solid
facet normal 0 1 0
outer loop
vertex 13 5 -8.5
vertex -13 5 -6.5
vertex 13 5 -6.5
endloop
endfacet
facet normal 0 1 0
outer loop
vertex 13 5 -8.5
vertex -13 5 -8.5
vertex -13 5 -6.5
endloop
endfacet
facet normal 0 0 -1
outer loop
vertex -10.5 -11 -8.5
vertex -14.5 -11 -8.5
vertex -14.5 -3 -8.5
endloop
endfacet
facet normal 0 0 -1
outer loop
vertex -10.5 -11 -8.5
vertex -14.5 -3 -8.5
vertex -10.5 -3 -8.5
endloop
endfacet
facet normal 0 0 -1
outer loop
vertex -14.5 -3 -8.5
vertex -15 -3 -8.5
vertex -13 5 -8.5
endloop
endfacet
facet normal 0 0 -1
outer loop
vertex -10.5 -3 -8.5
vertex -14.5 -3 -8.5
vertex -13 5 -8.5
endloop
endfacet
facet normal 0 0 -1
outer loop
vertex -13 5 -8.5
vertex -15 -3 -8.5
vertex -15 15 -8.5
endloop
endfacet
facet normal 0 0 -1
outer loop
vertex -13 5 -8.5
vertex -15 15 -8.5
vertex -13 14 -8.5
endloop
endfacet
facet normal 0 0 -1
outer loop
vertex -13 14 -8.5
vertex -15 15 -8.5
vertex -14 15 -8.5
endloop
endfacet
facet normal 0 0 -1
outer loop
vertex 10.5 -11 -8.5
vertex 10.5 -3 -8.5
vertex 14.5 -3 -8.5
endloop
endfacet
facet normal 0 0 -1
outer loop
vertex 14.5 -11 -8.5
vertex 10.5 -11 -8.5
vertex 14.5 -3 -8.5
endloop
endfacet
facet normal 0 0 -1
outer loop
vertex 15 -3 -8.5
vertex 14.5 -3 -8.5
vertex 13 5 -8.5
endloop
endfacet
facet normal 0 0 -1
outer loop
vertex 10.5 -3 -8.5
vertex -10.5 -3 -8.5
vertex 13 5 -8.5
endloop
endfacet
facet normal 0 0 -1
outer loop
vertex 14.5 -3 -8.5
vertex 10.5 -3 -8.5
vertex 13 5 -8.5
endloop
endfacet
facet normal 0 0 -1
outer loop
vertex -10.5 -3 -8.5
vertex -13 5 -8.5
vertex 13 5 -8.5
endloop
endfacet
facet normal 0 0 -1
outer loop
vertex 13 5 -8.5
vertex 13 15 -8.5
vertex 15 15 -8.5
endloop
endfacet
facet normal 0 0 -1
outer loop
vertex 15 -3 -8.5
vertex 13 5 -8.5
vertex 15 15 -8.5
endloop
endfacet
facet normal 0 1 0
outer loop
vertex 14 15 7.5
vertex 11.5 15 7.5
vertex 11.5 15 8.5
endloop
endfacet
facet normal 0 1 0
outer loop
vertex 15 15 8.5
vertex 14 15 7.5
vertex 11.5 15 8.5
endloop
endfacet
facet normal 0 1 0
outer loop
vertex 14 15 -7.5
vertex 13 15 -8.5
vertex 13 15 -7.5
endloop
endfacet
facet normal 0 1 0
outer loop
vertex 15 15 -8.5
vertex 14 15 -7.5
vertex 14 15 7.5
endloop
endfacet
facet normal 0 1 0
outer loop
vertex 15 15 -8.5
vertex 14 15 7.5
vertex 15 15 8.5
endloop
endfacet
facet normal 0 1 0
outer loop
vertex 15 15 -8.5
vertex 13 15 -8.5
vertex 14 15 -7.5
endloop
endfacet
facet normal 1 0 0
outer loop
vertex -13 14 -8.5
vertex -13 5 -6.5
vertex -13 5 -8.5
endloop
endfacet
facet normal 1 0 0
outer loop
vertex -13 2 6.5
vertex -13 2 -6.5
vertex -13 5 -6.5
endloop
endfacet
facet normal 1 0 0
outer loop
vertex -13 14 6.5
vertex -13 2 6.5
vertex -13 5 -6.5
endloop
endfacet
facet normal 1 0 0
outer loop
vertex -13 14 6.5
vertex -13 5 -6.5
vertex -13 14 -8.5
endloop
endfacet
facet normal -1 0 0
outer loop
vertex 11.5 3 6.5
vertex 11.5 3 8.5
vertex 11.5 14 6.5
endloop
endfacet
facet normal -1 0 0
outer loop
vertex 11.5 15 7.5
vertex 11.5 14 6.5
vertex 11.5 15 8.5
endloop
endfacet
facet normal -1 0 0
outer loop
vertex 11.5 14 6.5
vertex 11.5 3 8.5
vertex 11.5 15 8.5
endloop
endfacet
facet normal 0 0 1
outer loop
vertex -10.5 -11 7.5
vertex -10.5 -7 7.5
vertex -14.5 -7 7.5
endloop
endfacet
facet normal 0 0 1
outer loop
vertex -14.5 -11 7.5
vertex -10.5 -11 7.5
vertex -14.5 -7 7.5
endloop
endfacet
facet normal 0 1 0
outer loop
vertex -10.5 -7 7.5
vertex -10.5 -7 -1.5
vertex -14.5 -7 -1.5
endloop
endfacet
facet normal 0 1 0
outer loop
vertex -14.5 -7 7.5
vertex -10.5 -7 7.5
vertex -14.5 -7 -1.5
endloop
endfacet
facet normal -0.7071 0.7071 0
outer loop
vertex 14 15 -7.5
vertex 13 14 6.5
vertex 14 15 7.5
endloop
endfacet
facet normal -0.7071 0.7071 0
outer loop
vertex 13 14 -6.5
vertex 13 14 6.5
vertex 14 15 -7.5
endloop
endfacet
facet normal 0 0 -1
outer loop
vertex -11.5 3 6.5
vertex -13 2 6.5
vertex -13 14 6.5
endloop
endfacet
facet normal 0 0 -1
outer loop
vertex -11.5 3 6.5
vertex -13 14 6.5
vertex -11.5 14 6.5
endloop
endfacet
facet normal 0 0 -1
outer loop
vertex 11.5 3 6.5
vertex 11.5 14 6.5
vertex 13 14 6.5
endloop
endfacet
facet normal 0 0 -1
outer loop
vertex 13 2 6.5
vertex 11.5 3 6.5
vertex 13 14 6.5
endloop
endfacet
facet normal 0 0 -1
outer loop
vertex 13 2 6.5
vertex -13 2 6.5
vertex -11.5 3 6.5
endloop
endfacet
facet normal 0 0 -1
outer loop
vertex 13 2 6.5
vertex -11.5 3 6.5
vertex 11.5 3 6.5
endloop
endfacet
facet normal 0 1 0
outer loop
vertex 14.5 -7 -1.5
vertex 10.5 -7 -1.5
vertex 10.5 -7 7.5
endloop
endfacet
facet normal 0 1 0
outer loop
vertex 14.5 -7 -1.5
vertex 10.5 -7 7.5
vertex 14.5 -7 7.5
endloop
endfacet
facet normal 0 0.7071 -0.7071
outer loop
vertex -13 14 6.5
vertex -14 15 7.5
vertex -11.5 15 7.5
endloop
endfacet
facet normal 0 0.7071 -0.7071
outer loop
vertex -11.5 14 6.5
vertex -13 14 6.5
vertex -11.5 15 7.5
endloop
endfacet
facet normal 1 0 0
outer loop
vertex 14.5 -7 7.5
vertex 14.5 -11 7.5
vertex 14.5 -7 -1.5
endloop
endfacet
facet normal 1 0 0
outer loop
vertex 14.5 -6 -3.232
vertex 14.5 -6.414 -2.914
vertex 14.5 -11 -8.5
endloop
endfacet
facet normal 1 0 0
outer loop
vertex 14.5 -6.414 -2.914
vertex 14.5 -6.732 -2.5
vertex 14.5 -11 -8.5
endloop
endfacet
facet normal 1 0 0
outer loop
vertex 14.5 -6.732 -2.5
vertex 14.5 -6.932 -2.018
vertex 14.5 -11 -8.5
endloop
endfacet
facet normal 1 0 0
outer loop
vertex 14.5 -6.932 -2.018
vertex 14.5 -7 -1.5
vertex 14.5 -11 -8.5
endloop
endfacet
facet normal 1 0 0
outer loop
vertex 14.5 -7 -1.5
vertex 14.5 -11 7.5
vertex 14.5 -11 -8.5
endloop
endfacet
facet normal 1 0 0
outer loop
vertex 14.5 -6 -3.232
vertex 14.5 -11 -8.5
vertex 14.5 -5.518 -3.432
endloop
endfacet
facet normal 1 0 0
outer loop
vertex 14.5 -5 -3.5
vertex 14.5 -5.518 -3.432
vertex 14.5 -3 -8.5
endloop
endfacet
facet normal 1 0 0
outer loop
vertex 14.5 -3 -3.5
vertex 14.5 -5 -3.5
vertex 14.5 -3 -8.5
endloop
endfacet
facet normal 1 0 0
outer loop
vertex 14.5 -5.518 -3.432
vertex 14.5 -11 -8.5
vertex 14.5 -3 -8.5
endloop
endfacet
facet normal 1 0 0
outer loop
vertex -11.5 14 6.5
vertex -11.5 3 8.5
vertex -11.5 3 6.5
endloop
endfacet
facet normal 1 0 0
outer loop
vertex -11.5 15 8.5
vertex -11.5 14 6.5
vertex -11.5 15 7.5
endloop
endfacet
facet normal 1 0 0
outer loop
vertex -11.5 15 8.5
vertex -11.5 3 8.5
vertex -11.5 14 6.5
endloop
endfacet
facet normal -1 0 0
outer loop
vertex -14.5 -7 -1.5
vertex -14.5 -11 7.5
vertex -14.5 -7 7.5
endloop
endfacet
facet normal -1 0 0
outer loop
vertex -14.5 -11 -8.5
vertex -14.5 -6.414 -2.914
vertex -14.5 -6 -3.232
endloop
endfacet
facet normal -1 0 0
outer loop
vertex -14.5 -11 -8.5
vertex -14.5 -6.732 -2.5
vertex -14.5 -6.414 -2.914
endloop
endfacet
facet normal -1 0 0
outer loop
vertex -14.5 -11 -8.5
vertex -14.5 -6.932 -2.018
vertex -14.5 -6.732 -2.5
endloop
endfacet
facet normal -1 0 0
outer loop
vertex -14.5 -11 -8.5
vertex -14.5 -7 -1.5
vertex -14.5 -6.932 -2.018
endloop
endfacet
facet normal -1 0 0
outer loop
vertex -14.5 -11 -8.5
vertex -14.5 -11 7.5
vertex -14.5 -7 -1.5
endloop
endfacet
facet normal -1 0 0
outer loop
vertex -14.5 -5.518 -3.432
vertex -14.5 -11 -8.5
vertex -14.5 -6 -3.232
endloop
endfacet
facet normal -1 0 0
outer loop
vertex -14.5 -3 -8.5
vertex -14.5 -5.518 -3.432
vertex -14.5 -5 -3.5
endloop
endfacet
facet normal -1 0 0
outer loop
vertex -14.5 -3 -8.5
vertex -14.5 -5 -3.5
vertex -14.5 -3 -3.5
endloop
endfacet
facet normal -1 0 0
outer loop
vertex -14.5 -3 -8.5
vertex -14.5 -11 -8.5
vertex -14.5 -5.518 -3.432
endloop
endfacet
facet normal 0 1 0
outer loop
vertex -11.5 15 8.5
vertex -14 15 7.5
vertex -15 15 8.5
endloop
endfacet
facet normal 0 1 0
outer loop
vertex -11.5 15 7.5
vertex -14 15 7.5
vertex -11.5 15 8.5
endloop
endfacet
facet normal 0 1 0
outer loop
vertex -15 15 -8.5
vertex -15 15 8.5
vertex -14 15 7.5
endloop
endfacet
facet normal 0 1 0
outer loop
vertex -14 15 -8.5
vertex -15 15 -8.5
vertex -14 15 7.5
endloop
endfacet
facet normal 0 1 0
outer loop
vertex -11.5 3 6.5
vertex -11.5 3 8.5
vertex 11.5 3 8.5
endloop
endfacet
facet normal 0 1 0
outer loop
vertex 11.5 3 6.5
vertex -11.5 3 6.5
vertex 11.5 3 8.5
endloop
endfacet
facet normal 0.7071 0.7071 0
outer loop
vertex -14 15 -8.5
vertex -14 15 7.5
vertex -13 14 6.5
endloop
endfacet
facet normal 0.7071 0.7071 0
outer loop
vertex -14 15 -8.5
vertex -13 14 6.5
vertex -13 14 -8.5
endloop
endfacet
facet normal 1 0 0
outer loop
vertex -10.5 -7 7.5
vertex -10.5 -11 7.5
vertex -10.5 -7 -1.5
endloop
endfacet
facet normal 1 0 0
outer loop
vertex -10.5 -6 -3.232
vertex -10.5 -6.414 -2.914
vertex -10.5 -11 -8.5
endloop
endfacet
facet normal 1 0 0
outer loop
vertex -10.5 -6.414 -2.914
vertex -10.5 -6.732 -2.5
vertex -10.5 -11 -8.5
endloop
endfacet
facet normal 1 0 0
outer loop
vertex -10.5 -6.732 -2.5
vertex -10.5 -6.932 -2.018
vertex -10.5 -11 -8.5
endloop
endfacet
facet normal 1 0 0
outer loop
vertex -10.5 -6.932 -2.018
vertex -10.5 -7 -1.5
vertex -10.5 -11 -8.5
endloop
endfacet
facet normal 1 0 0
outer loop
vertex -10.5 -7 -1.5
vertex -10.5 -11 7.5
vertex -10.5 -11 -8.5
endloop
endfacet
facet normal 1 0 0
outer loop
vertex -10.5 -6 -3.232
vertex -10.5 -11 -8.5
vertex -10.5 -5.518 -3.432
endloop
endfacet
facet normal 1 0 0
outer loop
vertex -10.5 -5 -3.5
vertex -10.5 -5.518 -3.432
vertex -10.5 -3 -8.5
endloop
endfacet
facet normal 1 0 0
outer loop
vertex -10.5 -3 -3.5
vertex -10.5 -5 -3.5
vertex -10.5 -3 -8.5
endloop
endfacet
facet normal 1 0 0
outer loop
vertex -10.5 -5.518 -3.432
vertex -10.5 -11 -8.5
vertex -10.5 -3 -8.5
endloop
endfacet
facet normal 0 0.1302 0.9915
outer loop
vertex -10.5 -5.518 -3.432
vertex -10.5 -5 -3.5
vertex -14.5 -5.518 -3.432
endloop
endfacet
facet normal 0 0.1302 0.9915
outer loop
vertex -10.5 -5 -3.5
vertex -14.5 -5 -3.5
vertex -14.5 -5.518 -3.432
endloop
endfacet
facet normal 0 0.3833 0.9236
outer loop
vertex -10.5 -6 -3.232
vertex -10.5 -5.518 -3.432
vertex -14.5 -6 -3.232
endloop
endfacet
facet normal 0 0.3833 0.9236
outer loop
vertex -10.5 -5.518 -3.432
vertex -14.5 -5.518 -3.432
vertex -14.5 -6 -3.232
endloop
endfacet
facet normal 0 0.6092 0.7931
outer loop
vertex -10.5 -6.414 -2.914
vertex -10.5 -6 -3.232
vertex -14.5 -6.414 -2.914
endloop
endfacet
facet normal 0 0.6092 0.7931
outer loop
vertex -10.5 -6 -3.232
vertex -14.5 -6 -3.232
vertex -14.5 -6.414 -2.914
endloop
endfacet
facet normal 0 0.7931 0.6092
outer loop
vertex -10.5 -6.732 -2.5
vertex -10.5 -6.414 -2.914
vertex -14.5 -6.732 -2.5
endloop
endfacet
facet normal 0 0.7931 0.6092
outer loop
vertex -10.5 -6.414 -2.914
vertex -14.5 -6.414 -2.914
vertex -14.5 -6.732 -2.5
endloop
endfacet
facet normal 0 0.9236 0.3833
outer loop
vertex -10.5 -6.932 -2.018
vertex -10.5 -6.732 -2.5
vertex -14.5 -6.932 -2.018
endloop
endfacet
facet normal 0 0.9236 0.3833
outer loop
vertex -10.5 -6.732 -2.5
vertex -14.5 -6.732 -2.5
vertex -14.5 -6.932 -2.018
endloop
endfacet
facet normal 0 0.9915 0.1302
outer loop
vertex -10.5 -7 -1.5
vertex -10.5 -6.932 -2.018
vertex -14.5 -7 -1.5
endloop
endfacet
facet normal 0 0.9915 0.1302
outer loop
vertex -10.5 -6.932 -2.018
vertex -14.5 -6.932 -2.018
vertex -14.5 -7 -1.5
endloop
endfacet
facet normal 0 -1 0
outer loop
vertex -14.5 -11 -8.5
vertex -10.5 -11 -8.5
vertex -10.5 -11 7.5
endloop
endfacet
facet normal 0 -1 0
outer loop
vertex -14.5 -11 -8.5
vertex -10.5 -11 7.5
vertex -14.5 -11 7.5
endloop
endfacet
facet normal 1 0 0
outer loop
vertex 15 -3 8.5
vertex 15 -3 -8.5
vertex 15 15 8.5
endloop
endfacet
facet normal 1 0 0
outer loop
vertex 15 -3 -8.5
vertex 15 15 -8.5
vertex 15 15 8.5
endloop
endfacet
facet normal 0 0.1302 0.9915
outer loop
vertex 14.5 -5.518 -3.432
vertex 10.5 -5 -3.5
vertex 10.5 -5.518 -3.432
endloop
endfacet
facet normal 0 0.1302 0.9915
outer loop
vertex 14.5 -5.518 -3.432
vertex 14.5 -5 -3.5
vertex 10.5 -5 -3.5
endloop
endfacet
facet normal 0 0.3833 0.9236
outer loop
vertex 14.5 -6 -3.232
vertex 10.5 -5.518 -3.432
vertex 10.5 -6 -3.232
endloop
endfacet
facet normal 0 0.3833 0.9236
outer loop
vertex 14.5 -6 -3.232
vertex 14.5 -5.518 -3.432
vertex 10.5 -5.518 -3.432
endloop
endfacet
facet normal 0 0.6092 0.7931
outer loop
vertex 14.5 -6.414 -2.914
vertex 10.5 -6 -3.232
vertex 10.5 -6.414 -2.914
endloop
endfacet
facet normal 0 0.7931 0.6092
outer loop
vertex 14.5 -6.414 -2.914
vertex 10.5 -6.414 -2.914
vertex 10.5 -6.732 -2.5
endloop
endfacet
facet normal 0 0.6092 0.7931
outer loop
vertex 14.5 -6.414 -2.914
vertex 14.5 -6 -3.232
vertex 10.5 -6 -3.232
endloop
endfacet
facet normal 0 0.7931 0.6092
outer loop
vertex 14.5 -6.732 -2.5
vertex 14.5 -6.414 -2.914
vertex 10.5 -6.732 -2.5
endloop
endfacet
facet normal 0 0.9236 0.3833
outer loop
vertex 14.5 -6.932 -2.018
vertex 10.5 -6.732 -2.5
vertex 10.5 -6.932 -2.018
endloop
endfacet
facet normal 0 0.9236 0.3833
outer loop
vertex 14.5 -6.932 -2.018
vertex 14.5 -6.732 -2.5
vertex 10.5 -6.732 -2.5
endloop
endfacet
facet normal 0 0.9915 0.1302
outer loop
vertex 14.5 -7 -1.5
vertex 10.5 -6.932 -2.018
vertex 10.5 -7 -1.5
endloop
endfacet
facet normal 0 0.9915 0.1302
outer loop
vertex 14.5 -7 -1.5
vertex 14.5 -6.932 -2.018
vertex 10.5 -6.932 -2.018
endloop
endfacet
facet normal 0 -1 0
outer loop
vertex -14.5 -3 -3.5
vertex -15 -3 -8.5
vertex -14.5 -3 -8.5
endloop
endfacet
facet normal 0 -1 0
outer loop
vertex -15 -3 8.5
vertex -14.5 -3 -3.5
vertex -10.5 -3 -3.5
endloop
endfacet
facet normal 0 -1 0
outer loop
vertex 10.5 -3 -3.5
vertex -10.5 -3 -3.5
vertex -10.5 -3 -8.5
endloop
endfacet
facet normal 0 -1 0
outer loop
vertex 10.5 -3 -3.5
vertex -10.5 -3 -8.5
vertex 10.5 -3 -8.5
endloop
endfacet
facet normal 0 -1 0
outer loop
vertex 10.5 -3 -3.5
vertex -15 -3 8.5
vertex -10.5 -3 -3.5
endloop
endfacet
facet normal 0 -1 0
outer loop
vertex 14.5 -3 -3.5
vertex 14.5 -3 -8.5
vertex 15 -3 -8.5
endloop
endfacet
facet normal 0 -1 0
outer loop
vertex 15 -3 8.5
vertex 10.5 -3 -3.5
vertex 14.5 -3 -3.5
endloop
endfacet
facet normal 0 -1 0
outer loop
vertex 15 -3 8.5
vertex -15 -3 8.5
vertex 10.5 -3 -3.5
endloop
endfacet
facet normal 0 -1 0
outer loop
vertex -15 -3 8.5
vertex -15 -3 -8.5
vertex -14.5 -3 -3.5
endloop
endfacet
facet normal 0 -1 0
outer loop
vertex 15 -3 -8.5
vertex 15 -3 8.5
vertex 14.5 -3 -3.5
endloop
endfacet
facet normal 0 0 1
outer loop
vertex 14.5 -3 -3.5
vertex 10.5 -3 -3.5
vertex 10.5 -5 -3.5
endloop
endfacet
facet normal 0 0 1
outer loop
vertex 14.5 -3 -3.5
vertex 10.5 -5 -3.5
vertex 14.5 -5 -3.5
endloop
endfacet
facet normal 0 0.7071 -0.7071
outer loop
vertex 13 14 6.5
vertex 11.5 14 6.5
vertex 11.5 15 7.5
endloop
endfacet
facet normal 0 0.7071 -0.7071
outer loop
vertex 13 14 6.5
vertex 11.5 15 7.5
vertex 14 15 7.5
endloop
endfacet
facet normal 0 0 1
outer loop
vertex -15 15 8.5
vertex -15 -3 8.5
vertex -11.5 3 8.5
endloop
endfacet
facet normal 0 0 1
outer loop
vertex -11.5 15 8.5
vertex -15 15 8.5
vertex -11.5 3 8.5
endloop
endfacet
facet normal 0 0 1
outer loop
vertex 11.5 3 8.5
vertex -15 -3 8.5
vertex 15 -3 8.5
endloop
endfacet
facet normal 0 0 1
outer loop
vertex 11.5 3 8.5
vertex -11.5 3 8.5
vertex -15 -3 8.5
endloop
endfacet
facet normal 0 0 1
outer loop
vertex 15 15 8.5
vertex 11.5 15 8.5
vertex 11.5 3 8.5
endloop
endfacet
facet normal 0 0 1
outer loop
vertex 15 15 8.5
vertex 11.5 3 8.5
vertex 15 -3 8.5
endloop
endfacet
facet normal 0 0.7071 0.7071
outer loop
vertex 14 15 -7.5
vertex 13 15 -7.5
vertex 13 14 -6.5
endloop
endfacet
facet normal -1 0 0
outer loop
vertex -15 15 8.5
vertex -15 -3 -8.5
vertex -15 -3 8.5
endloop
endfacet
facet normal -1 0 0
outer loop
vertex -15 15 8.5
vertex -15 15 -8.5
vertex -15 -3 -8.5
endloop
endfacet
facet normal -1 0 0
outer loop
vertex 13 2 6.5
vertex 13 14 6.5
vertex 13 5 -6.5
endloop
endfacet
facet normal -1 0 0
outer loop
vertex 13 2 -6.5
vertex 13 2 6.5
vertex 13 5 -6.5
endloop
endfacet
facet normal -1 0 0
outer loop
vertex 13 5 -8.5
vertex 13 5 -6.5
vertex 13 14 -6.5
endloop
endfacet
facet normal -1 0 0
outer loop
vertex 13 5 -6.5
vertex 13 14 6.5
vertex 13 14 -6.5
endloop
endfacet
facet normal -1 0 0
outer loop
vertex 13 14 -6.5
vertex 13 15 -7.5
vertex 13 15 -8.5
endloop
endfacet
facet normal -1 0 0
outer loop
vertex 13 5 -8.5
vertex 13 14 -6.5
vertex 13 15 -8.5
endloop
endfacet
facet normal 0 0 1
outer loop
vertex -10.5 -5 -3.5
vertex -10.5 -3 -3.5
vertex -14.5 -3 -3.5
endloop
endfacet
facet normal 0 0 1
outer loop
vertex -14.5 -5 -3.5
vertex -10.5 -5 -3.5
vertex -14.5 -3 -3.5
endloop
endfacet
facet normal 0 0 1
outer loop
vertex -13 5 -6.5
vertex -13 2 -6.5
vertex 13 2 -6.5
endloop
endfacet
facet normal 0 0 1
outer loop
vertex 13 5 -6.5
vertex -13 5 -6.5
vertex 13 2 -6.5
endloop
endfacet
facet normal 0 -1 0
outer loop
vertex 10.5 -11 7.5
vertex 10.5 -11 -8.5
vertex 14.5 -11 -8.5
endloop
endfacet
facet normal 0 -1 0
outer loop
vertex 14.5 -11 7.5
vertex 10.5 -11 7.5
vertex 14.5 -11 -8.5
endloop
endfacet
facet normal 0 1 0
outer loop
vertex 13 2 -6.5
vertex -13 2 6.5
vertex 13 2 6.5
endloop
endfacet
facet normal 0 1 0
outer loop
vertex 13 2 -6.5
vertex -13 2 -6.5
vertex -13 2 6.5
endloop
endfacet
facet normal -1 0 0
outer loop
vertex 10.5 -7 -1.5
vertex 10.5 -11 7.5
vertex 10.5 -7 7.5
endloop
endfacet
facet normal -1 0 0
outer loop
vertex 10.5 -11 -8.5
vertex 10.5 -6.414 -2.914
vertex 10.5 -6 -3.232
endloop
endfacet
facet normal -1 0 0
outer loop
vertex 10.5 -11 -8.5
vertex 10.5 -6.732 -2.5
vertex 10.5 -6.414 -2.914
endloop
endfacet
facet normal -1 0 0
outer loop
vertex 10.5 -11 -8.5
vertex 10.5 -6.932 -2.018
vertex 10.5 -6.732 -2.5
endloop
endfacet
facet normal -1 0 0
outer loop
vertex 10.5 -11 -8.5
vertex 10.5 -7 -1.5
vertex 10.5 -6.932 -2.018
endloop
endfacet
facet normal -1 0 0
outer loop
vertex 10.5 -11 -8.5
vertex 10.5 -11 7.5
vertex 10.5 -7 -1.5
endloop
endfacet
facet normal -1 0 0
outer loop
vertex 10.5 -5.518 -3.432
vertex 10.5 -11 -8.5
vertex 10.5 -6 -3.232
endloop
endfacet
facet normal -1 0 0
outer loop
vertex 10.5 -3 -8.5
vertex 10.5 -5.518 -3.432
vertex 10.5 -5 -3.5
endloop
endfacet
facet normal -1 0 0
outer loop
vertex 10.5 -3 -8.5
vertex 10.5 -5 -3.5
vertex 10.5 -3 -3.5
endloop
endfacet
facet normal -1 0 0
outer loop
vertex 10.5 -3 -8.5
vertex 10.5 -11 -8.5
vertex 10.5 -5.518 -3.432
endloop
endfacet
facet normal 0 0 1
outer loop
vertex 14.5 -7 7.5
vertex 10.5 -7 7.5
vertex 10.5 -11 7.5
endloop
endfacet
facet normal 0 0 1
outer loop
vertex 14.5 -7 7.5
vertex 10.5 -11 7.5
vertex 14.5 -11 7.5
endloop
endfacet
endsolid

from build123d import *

# Parameters (mm, degrees)
SKETCH_2_W          = 30
SKETCH_2_H          = 17
EXTRUDE_1_DEPTH     = 2
SKETCH_2_3_W        = 30
SKETCH_2_3_H        = 17
SKETCH_2_3_W_2      = 26
SKETCH_2_3_H_2      = 13
EXTRUDE_2_DEPTH     = 15
CUT_EXTRUDE_1_REACH = 29.185
SKETCH_3_W          = 23
SKETCH_3_H          = 12
CUT_EXTRUDE_2_REACH = 27.981
SKETCH_4_W          = 12
SKETCH_4_H          = 6
CHAMFER_2_SIZE      = 1
SKETCH_5_W          = 30
SKETCH_5_H          = 17
EXTRUDE_3_DEPTH     = 3
EXTRUDE_4_DEPTH     = 4
SKETCH_7_W          = 4
SKETCH_7_H          = 4
EXTRUDE_5_DEPTH     = 16
FILLET_1_R          = 2
CUT_EXTRUDE_3_DEPTH = 10


with BuildPart() as part:
    # 草图2 → 凸台-拉伸1 (new body)
    with BuildSketch(Plane(origin=(0, 0, 0), x_dir=(1, 0, 0), z_dir=(0, 1, 0))):
        Rectangle(SKETCH_2_W, SKETCH_2_H)
    extrude(amount=EXTRUDE_1_DEPTH)

    # 草图2<3> → 凸台-拉伸2 (add)
    with BuildSketch(Plane(origin=(0, 0, 0), x_dir=(1, 0, 0), z_dir=(0, 1, 0))):
        Rectangle(SKETCH_2_3_W, SKETCH_2_3_H)
        Rectangle(SKETCH_2_3_W_2, SKETCH_2_3_H_2, mode=Mode.SUBTRACT)
    extrude(amount=EXTRUDE_2_DEPTH)

    # 草图3 → 切除-拉伸1 (cut, up to next)
    with BuildSketch(Plane.XY.offset(8.5), mode=Mode.PRIVATE) as cut_extrude_1_sk1:
        with Locations((0, 9)):
            Rectangle(SKETCH_3_W, SKETCH_3_H)
    cut_extrude_1_tool1 = extrude(cut_extrude_1_sk1.sketch, amount=-CUT_EXTRUDE_1_REACH, mode=Mode.PRIVATE) & part.part
    add(cut_extrude_1_tool1.solids().sort_by_distance((0, 9, 8.5))[0], mode=Mode.SUBTRACT)

    # 草图4 → 切除-拉伸2 (cut, up to next)
    with BuildSketch(Plane.XY.offset(-6.5), mode=Mode.PRIVATE) as cut_extrude_2_sk1:
        with Locations((-7, 12)):
            Rectangle(SKETCH_4_W, SKETCH_4_H)
    cut_extrude_2_tool1 = extrude(cut_extrude_2_sk1.sketch, amount=-CUT_EXTRUDE_2_REACH, mode=Mode.PRIVATE) & part.part
    add(cut_extrude_2_tool1.solids().sort_by_distance((-7, 12, -6.5))[0], mode=Mode.SUBTRACT)

    # 倒角2
    chamfer_2_edges = [part.edges().sort_by_distance(p)[0] for p in [
        (13, 15, 0),
        (6, 15, -6.5),
        (-13, 15, -1),
        (-12.25, 15, 6.5),
        (12.25, 15, 6.5),
    ]]
    chamfer(chamfer_2_edges, length=CHAMFER_2_SIZE)

    # 草图5 → 凸台-拉伸3 (add)
    with BuildSketch(Plane.XZ):
        Rectangle(SKETCH_5_W, SKETCH_5_H)
    extrude(amount=EXTRUDE_3_DEPTH)

    # 草图6 → 凸台-拉伸4 (add)
    with BuildSketch(Plane.XZ.offset(3)):
        Polygon((-12.5, -3.5), (-10.5, -3.5), (-10.5, -8.5), (-14.5, -8.5), (-14.5, -3.5), align=None)
    extrude_4 = extrude(amount=EXTRUDE_4_DEPTH)

    # 草图7 → 凸台-拉伸5 (add)
    with BuildSketch(Plane(origin=(0, 0, -8.5), x_dir=(-1, 0, 0), z_dir=(0, 0, -1))):
        with Locations((12.5, -9)):
            Rectangle(SKETCH_7_W, SKETCH_7_H)
    extrude_5 = extrude(amount=-EXTRUDE_5_DEPTH)

    # 镜向1: 凸台-拉伸4, 凸台-拉伸5 across plane
    add(extrude_4.mirror(Plane(origin=(0, 0, 0), x_dir=(0, 0, 1), z_dir=(1, 0, 0))))
    add(extrude_5.mirror(Plane(origin=(0, 0, 0), x_dir=(0, 0, 1), z_dir=(1, 0, 0))))

    # 圆角1
    fillet_1_edges = [part.edges().sort_by_distance(p)[0] for p in [
        (-12.5, -7, -3.5),
        (12.5, -7, -3.5),
    ]]
    fillet(fillet_1_edges, radius=FILLET_1_R)

    # 草图8 → 切除-拉伸3 (cut)
    with BuildSketch(Plane(origin=(0, 15, 0), x_dir=(1, 0, 0), z_dir=(0, 1, 0))):
        Polygon((13, 6.5), (13, 9.517493256), (-13, 9.517493256), (-13, 5.799908087), (12.835608811, 5.799908087), align=None)
    extrude(amount=-CUT_EXTRUDE_3_DEPTH, mode=Mode.SUBTRACT)


solid = part.part
